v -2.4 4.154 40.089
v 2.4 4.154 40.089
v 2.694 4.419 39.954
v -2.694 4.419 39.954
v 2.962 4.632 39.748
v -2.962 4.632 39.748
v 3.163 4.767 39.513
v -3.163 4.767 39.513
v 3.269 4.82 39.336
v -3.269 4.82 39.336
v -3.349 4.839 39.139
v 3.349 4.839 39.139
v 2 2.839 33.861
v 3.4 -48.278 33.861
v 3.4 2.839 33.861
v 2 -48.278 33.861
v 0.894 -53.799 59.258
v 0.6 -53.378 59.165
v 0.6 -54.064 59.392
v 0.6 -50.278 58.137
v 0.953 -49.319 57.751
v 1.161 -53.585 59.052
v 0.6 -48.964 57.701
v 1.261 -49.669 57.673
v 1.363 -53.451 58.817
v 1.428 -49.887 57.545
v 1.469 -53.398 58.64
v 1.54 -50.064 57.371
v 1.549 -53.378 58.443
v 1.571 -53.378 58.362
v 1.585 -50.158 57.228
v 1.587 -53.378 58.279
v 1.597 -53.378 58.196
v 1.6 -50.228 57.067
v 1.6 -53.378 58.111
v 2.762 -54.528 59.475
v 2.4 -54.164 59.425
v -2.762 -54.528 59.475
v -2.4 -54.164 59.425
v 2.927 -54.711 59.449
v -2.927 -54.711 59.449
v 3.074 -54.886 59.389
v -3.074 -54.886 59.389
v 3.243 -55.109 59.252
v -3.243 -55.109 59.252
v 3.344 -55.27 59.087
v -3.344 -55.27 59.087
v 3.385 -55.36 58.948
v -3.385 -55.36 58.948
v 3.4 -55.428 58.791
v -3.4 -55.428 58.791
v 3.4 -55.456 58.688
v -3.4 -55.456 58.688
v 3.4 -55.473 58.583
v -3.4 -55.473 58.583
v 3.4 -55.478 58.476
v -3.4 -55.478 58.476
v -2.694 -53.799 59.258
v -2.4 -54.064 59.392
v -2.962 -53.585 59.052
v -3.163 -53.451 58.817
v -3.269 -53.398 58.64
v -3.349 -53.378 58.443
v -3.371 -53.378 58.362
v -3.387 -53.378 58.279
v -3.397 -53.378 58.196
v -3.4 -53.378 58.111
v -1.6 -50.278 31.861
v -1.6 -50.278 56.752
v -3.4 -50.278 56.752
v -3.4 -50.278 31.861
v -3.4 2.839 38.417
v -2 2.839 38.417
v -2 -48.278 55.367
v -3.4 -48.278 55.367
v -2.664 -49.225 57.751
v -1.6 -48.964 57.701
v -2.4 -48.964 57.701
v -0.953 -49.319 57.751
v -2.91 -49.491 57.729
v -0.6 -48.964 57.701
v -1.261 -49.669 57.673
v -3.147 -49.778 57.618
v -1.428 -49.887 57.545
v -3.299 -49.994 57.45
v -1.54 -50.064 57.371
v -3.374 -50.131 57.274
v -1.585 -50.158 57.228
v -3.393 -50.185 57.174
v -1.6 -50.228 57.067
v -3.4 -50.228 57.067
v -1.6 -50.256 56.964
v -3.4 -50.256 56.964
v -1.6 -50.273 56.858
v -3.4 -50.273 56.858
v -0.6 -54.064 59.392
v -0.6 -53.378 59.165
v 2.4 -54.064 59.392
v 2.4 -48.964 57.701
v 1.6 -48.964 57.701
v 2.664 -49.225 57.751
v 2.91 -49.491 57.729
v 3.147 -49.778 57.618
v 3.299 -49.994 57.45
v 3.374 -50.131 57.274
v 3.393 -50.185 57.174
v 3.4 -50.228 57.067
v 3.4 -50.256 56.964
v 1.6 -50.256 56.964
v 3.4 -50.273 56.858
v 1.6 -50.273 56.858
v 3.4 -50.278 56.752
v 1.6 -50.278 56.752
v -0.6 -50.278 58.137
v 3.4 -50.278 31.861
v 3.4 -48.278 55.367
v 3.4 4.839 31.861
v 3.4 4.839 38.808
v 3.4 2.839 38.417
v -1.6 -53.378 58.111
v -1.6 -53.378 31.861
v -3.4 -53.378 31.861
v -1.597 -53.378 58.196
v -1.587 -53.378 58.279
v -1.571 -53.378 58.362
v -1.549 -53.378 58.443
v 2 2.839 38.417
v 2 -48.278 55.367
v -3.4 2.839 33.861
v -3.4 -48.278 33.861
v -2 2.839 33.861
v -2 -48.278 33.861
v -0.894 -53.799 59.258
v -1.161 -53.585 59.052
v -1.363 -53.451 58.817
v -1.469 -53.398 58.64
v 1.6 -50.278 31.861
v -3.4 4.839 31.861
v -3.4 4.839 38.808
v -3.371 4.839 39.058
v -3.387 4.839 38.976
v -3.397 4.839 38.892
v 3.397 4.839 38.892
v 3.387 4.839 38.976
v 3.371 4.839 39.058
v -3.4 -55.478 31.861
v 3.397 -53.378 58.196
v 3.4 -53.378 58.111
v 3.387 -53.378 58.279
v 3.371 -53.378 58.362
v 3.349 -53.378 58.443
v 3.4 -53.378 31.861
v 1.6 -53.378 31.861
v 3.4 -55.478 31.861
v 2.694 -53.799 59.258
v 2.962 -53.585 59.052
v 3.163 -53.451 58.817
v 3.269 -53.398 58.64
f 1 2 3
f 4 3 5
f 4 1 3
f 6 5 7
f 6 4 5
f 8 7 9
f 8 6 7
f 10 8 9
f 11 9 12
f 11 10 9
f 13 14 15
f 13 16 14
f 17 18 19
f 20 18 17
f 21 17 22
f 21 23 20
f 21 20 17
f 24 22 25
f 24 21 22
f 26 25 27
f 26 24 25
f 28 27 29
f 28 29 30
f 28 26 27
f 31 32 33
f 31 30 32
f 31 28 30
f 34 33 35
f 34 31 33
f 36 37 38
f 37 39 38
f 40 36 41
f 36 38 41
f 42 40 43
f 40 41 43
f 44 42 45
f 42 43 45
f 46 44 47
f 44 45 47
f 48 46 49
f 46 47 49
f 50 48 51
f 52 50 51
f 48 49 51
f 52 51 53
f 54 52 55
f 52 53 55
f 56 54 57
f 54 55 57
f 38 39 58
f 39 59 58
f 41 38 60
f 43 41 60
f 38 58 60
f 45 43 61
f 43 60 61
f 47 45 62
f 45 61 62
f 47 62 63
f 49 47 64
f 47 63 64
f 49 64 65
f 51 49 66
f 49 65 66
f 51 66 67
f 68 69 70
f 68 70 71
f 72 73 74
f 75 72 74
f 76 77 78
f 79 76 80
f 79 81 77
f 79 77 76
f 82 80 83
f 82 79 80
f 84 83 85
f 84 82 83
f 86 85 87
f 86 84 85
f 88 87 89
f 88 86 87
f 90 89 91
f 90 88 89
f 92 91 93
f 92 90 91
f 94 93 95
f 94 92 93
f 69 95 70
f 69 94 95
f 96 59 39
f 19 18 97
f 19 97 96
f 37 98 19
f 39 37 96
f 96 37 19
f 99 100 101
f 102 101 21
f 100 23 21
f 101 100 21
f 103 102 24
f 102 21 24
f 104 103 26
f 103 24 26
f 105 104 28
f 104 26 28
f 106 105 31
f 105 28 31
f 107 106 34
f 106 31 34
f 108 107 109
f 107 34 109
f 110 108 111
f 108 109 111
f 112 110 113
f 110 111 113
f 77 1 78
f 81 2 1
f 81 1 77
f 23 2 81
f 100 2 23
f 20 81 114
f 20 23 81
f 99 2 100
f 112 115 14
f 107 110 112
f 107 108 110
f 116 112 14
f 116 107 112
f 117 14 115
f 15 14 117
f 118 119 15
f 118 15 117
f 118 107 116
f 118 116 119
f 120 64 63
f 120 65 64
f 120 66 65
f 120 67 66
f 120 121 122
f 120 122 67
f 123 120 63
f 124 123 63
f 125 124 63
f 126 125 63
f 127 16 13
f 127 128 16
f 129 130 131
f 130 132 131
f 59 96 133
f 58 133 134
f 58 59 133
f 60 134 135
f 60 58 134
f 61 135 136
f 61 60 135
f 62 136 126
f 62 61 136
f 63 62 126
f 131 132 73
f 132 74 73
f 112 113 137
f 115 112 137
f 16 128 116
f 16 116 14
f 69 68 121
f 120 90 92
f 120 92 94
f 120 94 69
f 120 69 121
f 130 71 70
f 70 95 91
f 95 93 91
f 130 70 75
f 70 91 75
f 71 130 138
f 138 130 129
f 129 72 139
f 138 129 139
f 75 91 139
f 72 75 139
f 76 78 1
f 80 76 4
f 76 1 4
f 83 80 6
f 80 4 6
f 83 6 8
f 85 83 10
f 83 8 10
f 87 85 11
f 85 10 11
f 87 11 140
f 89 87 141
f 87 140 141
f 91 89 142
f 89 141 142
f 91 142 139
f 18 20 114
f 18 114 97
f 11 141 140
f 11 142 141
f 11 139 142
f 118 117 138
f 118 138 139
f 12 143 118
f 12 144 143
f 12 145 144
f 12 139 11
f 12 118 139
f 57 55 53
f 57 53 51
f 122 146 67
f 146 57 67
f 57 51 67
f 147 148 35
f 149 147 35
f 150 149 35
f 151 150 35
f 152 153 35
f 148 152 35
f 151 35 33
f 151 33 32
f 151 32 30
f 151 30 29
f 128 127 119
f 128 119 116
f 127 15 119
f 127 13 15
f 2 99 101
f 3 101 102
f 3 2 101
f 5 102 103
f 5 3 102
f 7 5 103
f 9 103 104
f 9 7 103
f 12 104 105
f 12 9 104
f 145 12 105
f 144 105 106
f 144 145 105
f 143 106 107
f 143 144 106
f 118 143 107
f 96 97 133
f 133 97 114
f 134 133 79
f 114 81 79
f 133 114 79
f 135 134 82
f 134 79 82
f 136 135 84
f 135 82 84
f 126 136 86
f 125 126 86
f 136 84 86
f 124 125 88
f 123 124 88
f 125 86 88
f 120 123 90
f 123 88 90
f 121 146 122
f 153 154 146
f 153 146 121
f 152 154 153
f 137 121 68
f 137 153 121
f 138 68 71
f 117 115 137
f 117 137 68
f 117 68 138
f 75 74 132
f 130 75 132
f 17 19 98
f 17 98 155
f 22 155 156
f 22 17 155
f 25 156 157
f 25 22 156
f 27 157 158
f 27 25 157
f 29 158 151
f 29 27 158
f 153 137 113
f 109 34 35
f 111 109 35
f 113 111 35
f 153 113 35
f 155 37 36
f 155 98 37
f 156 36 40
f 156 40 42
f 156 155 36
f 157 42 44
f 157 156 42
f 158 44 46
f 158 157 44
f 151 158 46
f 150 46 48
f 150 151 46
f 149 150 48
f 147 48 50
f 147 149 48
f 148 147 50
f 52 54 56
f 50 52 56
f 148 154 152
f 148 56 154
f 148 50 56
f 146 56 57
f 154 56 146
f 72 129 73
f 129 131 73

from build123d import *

# Parameters (mm, degrees)
F1_DEPTH     = 1.6
F2_DEPTH     = 3.4
F3_T         = -2
F5_T1_DEPTH  = 10.409799149
F5_T3_DEPTH  = 63.0683209094
F5_T5_DEPTH  = 5.2627965391
F5_T7_DEPTH  = 3.6048995745
F5_T9_DEPTH  = 7.2124323677
F5_T11_DEPTH = 13.7255930783
F5_T13_DEPTH = 3.6048995745
F5_T15_DEPTH = 5.2627965391
F5_T20_DEPTH = 8.7255930783
F5_T25_DEPTH = 8.2659715904
F5_T31_DEPTH = 8.2659715904
F5_T37_DEPTH = 8.7255930783
F5_T43_DEPTH = 8.7255930783
F5_T48_DEPTH = 8.2659715904
F5_T55_DEPTH = 8.2659715904
F5_T59_DEPTH = 5.409799149
F5_T66_DEPTH = 5.409799149
F5_T70_DEPTH = 8.2659715904
F5_T77_DEPTH = 8.2659715904
F5_T81_DEPTH = 8.7255930783


# Not quite as in the source:
# - a fillet or chamfer that OpenCascade refuses, or shapes differently, is made with other operations: its cross-section is extruded or revolved along the edge and cut away or added


with BuildPart() as f1:
    # F0 (on Right) → F1 (new body)
    with BuildSketch(Plane.YZ):
        Polygon((-50.2783237807, 58.1370850594), (-53.3783237807, 59.1649811775), (-53.3783237807, 31.8612979027), (-50.2783237807, 31.8612979027), align=None)
    extrude(amount=F1_DEPTH)

    # F0 (on Right) → F2 (join)
    with BuildSketch(Plane.YZ):
        Polygon((4.8390554843, 39.8612979027), (-50.2783237807, 58.1370850594), (-50.2783237807, 31.8612979027), (4.8390554843, 31.8612979027), align=None)
        Polygon((-53.3783237807, 59.1649811775), (-55.4783237807, 59.8612979027), (-55.4783237807, 31.8612979027), (-53.3783237807, 31.8612979027), align=None)
    extrude(amount=F2_DEPTH)

    # F3
    f3_openings = [f1.faces().sort_by_distance(p)[0] for p in [
        (3.4, -27.617715, 41.242296),
    ]]
    offset(amount=F3_T, openings=f3_openings)

    # F4: F1 across face


with BuildPart() as f1_1:
    add(f1.part)
    add(f1.part.mirror(Plane.YZ))

    # F5: fillet of radius 1 on 12 edges, made by hand

    # F5_s2 → F5_t1 (cut)
    with BuildSketch(Plane.YZ.offset(-5.2048995745)):
        with BuildLine():
            ThreePointArc((4.1537845288, 40.0885196301), (4.6498356778, 39.7246888034), (4.8390554843, 39.1393380729))
            Line((4.8390554843, 39.1393380729), (4.8390554843, 39.8612979027))
            Line((4.8390554843, 39.8612979027), (4.1537845288, 40.0885196301))
        make_face()
    extrude(amount=F5_T1_DEPTH, mode=Mode.SUBTRACT)

    # F5_s4 → F5_t3 (cut)
    with BuildSketch(Plane(origin=(0, -5.1752852335, 1.716017936), x_dir=(1, 0, 0), z_dir=(0, -0.9491815572, 0.3147290445))):
        with BuildLine():
            ThreePointArc((2.4, 39.3586001244), (3.1071067812, 39.0657069056), (3.4, 38.3586001244))
            Line((3.4, 38.3586001244), (3.4, 39.3586001244))
            Line((3.4, 39.3586001244), (2.4, 39.3586001244))
        make_face()
        with BuildLine():
            ThreePointArc((-2.4, 39.3586001244), (-3.1071067812, 39.0657069056), (-3.4, 38.3586001244))
            Line((-3.4, 38.3586001244), (-3.4, 39.3586001244))
            Line((-3.4, 39.3586001244), (-2.4, 39.3586001244))
        make_face()
    extrude(amount=F5_T3_DEPTH, mode=Mode.SUBTRACT)

    # F5_s6 → F5_t5 (cut)
    with BuildSketch(Plane.YZ.offset(1.6)):
        with BuildLine():
            ThreePointArc((-48.9635947362, 57.701148001), (-49.8636745112, 57.5627466373), (-50.2783237807, 56.7519664438))
            Line((-50.2783237807, 56.7519664438), (-50.2783237807, 58.1370850594))
            Line((-50.2783237807, 58.1370850594), (-48.9635947362, 57.701148001))
        make_face()
    extrude(amount=F5_T5_DEPTH, mode=Mode.SUBTRACT)

    # F5_s8 → F5_t7 (cut)
    with BuildSketch(Plane.YZ.offset(1.6)):
        with BuildLine():
            ThreePointArc((-54.0635947362, 59.3922029049), (-53.5675435871, 59.0283720783), (-53.3783237807, 58.4430213477))
            Line((-53.3783237807, 58.4430213477), (-53.3783237807, 59.1649811775))
            Line((-53.3783237807, 59.1649811775), (-54.0635947362, 59.3922029049))
        make_face()
    extrude(amount=F5_T7_DEPTH, mode=Mode.SUBTRACT)

    # F5_s10 → F5_t9 (cut)
    with BuildSketch(Plane(origin=(0, -63.3926644985, 21.0197012108), x_dir=(1, 0, 0), z_dir=(0, -0.9491815572, 0.3147290445))):
        with BuildLine():
            ThreePointArc((2.4, 39.3586001244), (3.1071067812, 39.0657069056), (3.4, 38.3586001244))
            Line((3.4, 38.3586001244), (3.4, 39.3586001244))
            Line((3.4, 39.3586001244), (2.4, 39.3586001244))
        make_face()
        with BuildLine():
            ThreePointArc((-2.4, 39.3586001244), (-3.1071067812, 39.0657069056), (-3.4, 38.3586001244))
            Line((-3.4, 38.3586001244), (-3.4, 39.3586001244))
            Line((-3.4, 39.3586001244), (-2.4, 39.3586001244))
        make_face()
    extrude(amount=F5_T9_DEPTH, mode=Mode.SUBTRACT)

    # F5_s12 → F5_t11 (cut)
    with BuildSketch(Plane.YZ.offset(-6.8627965391)):
        with BuildLine():
            ThreePointArc((-54.1635947362, 59.4253608442), (-55.0636745112, 59.2869594806), (-55.4783237807, 58.476179287))
            Line((-55.4783237807, 58.476179287), (-55.4783237807, 59.8612979027))
            Line((-55.4783237807, 59.8612979027), (-54.1635947362, 59.4253608442))
        make_face()
    extrude(amount=F5_T11_DEPTH, mode=Mode.SUBTRACT)

    # F5_s14 → F5_t13 (cut)
    with BuildSketch(Plane.YZ.offset(-5.2048995745)):
        with BuildLine():
            ThreePointArc((-54.0635947362, 59.3922029049), (-53.5675435871, 59.0283720783), (-53.3783237807, 58.4430213477))
            Line((-53.3783237807, 58.4430213477), (-53.3783237807, 59.1649811775))
            Line((-53.3783237807, 59.1649811775), (-54.0635947362, 59.3922029049))
        make_face()
    extrude(amount=F5_T13_DEPTH, mode=Mode.SUBTRACT)

    # F5_s16 → F5_t15 (cut)
    with BuildSketch(Plane.YZ.offset(-6.8627965391)):
        with BuildLine():
            ThreePointArc((-48.9635947362, 57.701148001), (-49.8636745112, 57.5627466373), (-50.2783237807, 56.7519664438))
            Line((-50.2783237807, 56.7519664438), (-50.2783237807, 58.1370850594))
            Line((-50.2783237807, 58.1370850594), (-48.9635947362, 57.701148001))
        make_face()
    extrude(amount=F5_T15_DEPTH, mode=Mode.SUBTRACT)


with BuildPart() as f5_tool18:
    # F5_s19 → F5_t20 (new body)
    with BuildSketch(Plane.YZ.offset(-1.8627965391)):
        with BuildLine():
            ThreePointArc((-48.9635947362, 57.701148001), (-49.8636745112, 57.5627466373), (-50.2783237807, 56.7519664438))
            Line((-50.2783237807, 56.7519664438), (-50.2783237807, 58.1370850594))
            Line((-50.2783237807, 58.1370850594), (-48.9635947362, 57.701148001))
        make_face()
    extrude(amount=F5_T20_DEPTH)

    split(bisect_by=Plane.YZ.offset(-1.6), keep=Keep.BOTTOM)


with BuildPart() as f1_2:
    add(f1_1.part)

    # F5_t17: cut F5_tool18
    add(f5_tool18.part, mode=Mode.SUBTRACT)


with BuildPart() as f5_tool23:
    # F5_s24 → F5_t25 (new body)
    with BuildSketch(Plane(origin=(0, -60.2926644985, 19.9918050927), x_dir=(1, 0, 0), z_dir=(0, -0.9491815572, 0.3147290445))):
        with BuildLine():
            ThreePointArc((0.6, 39.3586001244), (1.3071067812, 39.0657069056), (1.6, 38.3586001244))
            Line((1.6, 38.3586001244), (1.6, 39.3586001244))
            Line((1.6, 39.3586001244), (0.6, 39.3586001244))
        make_face()
    extrude(amount=F5_T25_DEPTH)

    split(bisect_by=Plane.XZ.offset(53.3783237807), keep=Keep.BOTTOM)

    split(bisect_by=Plane.XZ.offset(50.2783237807), keep=Keep.TOP)


with BuildPart() as f1_3:
    add(f1_2.part)

    # F5_t22: cut F5_tool23
    add(f5_tool23.part, mode=Mode.SUBTRACT)


with BuildPart() as f5_tool29:
    # F5_s30 → F5_t31 (new body)
    with BuildSketch(Plane(origin=(0, -60.2926644985, 19.9918050927), x_dir=(1, 0, 0), z_dir=(0, -0.9491815572, 0.3147290445))):
        with BuildLine():
            ThreePointArc((-0.6, 39.3586001244), (-1.3071067812, 39.0657069056), (-1.6, 38.3586001244))
            Line((-1.6, 38.3586001244), (-1.6, 39.3586001244))
            Line((-1.6, 39.3586001244), (-0.6, 39.3586001244))
        make_face()
    extrude(amount=F5_T31_DEPTH)

    split(bisect_by=Plane.XZ.offset(50.2783237807), keep=Keep.TOP)

    split(bisect_by=Plane.XZ.offset(53.3783237807), keep=Keep.BOTTOM)


with BuildPart() as f1_4:
    add(f1_3.part)

    # F5_t28: cut F5_tool29
    add(f5_tool29.part, mode=Mode.SUBTRACT)


with BuildPart() as f5_tool35:
    # F5_s36 → F5_t37 (new body)
    with BuildSketch(Plane.YZ.offset(1.8627965391)):
        with BuildLine():
            ThreePointArc((-48.9635947362, 57.701148001), (-49.8636745112, 57.5627466373), (-50.2783237807, 56.7519664438))
            Line((-50.2783237807, 56.7519664438), (-50.2783237807, 58.1370850594))
            Line((-50.2783237807, 58.1370850594), (-48.9635947362, 57.701148001))
        make_face()
    extrude(amount=-F5_T37_DEPTH)

    split(bisect_by=Plane.YZ.offset(1.6), keep=Keep.TOP)


with BuildPart() as f1_5:
    add(f1_4.part)

    # F5_t34: cut F5_tool35
    add(f5_tool35.part, mode=Mode.SUBTRACT)


with BuildPart() as f5_tool41:
    # F5_s42 → F5_t43 (new body)
    with BuildSketch(Plane.YZ.offset(-1.8627965391)):
        with BuildLine():
            ThreePointArc((-48.9635947362, 57.701148001), (-49.8636745112, 57.5627466373), (-50.2783237807, 56.7519664438))
            Line((-50.2783237807, 56.7519664438), (-50.2783237807, 58.1370850594))
            Line((-50.2783237807, 58.1370850594), (-48.9635947362, 57.701148001))
        make_face()
    extrude(amount=F5_T43_DEPTH)

    split(bisect_by=Plane.YZ.offset(-1.6), keep=Keep.TOP)

    split(bisect_by=Plane.YZ.offset(1.6), keep=Keep.BOTTOM)


with BuildPart() as f5_tool46:
    # F5_s47 → F5_t48 (new body)
    with BuildSketch(Plane(origin=(0, -60.2926644985, 19.9918050927), x_dir=(1, 0, 0), z_dir=(0, -0.9491815572, 0.3147290445))):
        with BuildLine():
            ThreePointArc((0.6, 39.3586001244), (1.3071067812, 39.0657069056), (1.6, 38.3586001244))
            Line((1.6, 38.3586001244), (1.6, 39.3586001244))
            Line((1.6, 39.3586001244), (0.6, 39.3586001244))
        make_face()
    extrude(amount=F5_T48_DEPTH)

    split(bisect_by=Plane.XZ.offset(50.2783237807), keep=Keep.BOTTOM)


with BuildPart() as f5_tool41_1:
    add(f5_tool41.part)

    # F5_t50: intersect F5_tool46
    add(f5_tool46.part, mode=Mode.INTERSECT)


with BuildPart() as f1_6:
    add(f1_5.part)

    # F5_t39: cut F5_tool41
    add(f5_tool41_1.part, mode=Mode.SUBTRACT)


with BuildPart() as f5_tool53:
    # F5_s54 → F5_t55 (new body)
    with BuildSketch(Plane(origin=(0, -60.2926644985, 19.9918050927), x_dir=(1, 0, 0), z_dir=(0, -0.9491815572, 0.3147290445))):
        with BuildLine():
            ThreePointArc((0.6, 39.3586001244), (1.3071067812, 39.0657069056), (1.6, 38.3586001244))
            Line((1.6, 38.3586001244), (1.6, 39.3586001244))
            Line((1.6, 39.3586001244), (0.6, 39.3586001244))
        make_face()
    extrude(amount=F5_T55_DEPTH)

    split(bisect_by=Plane.XZ.offset(53.3783237807), keep=Keep.TOP)


with BuildPart() as f5_tool57:
    # F5_s58 → F5_t59 (new body)
    with BuildSketch(Plane.YZ.offset(-0.2048995745)):
        with BuildLine():
            ThreePointArc((-54.0635947362, 59.3922029049), (-53.5675435871, 59.0283720783), (-53.3783237807, 58.4430213477))
            Line((-53.3783237807, 58.4430213477), (-53.3783237807, 59.1649811775))
            Line((-53.3783237807, 59.1649811775), (-54.0635947362, 59.3922029049))
        make_face()
    extrude(amount=F5_T59_DEPTH)

    split(bisect_by=Plane.YZ.offset(1.6), keep=Keep.BOTTOM)


with BuildPart() as f5_tool53_1:
    add(f5_tool53.part)

    # F5_t61: intersect F5_tool57
    add(f5_tool57.part, mode=Mode.INTERSECT)


with BuildPart() as f1_7:
    add(f1_6.part)

    # F5_t51: cut F5_tool53
    add(f5_tool53_1.part, mode=Mode.SUBTRACT)


with BuildPart() as f5_tool64:
    # F5_s65 → F5_t66 (new body)
    with BuildSketch(Plane.YZ.offset(0.2048995745)):
        with BuildLine():
            ThreePointArc((-54.0635947362, 59.3922029049), (-53.5675435871, 59.0283720783), (-53.3783237807, 58.4430213477))
            Line((-53.3783237807, 58.4430213477), (-53.3783237807, 59.1649811775))
            Line((-53.3783237807, 59.1649811775), (-54.0635947362, 59.3922029049))
        make_face()
    extrude(amount=-F5_T66_DEPTH)

    split(bisect_by=Plane.YZ.offset(-1.6), keep=Keep.TOP)


with BuildPart() as f5_tool68:
    # F5_s69 → F5_t70 (new body)
    with BuildSketch(Plane(origin=(0, -60.2926644985, 19.9918050927), x_dir=(1, 0, 0), z_dir=(0, -0.9491815572, 0.3147290445))):
        with BuildLine():
            ThreePointArc((-0.6, 39.3586001244), (-1.3071067812, 39.0657069056), (-1.6, 38.3586001244))
            Line((-1.6, 38.3586001244), (-1.6, 39.3586001244))
            Line((-1.6, 39.3586001244), (-0.6, 39.3586001244))
        make_face()
    extrude(amount=F5_T70_DEPTH)

    split(bisect_by=Plane.XZ.offset(53.3783237807), keep=Keep.TOP)


with BuildPart() as f5_tool64_1:
    add(f5_tool64.part)

    # F5_t72: intersect F5_tool68
    add(f5_tool68.part, mode=Mode.INTERSECT)


with BuildPart() as f1_8:
    add(f1_7.part)

    # F5_t62: cut F5_tool64
    add(f5_tool64_1.part, mode=Mode.SUBTRACT)


with BuildPart() as f5_tool75:
    # F5_s76 → F5_t77 (new body)
    with BuildSketch(Plane(origin=(0, -60.2926644985, 19.9918050927), x_dir=(1, 0, 0), z_dir=(0, -0.9491815572, 0.3147290445))):
        with BuildLine():
            ThreePointArc((-0.6, 39.3586001244), (-1.3071067812, 39.0657069056), (-1.6, 38.3586001244))
            Line((-1.6, 38.3586001244), (-1.6, 39.3586001244))
            Line((-1.6, 39.3586001244), (-0.6, 39.3586001244))
        make_face()
    extrude(amount=F5_T77_DEPTH)

    split(bisect_by=Plane.XZ.offset(50.2783237807), keep=Keep.BOTTOM)


with BuildPart() as f5_tool79:
    # F5_s80 → F5_t81 (new body)
    with BuildSketch(Plane.YZ.offset(1.8627965391)):
        with BuildLine():
            ThreePointArc((-48.9635947362, 57.701148001), (-49.8636745112, 57.5627466373), (-50.2783237807, 56.7519664438))
            Line((-50.2783237807, 56.7519664438), (-50.2783237807, 58.1370850594))
            Line((-50.2783237807, 58.1370850594), (-48.9635947362, 57.701148001))
        make_face()
    extrude(amount=-F5_T81_DEPTH)

    split(bisect_by=Plane.YZ.offset(-1.6), keep=Keep.TOP)

    split(bisect_by=Plane.YZ.offset(1.6), keep=Keep.BOTTOM)


with BuildPart() as f5_tool75_1:
    add(f5_tool75.part)

    # F5_t84: intersect F5_tool79
    add(f5_tool79.part, mode=Mode.INTERSECT)


with BuildPart() as f1_9:
    add(f1_8.part)

    # F5_t73: cut F5_tool75
    add(f5_tool75_1.part, mode=Mode.SUBTRACT)


solid = f1_9.part
